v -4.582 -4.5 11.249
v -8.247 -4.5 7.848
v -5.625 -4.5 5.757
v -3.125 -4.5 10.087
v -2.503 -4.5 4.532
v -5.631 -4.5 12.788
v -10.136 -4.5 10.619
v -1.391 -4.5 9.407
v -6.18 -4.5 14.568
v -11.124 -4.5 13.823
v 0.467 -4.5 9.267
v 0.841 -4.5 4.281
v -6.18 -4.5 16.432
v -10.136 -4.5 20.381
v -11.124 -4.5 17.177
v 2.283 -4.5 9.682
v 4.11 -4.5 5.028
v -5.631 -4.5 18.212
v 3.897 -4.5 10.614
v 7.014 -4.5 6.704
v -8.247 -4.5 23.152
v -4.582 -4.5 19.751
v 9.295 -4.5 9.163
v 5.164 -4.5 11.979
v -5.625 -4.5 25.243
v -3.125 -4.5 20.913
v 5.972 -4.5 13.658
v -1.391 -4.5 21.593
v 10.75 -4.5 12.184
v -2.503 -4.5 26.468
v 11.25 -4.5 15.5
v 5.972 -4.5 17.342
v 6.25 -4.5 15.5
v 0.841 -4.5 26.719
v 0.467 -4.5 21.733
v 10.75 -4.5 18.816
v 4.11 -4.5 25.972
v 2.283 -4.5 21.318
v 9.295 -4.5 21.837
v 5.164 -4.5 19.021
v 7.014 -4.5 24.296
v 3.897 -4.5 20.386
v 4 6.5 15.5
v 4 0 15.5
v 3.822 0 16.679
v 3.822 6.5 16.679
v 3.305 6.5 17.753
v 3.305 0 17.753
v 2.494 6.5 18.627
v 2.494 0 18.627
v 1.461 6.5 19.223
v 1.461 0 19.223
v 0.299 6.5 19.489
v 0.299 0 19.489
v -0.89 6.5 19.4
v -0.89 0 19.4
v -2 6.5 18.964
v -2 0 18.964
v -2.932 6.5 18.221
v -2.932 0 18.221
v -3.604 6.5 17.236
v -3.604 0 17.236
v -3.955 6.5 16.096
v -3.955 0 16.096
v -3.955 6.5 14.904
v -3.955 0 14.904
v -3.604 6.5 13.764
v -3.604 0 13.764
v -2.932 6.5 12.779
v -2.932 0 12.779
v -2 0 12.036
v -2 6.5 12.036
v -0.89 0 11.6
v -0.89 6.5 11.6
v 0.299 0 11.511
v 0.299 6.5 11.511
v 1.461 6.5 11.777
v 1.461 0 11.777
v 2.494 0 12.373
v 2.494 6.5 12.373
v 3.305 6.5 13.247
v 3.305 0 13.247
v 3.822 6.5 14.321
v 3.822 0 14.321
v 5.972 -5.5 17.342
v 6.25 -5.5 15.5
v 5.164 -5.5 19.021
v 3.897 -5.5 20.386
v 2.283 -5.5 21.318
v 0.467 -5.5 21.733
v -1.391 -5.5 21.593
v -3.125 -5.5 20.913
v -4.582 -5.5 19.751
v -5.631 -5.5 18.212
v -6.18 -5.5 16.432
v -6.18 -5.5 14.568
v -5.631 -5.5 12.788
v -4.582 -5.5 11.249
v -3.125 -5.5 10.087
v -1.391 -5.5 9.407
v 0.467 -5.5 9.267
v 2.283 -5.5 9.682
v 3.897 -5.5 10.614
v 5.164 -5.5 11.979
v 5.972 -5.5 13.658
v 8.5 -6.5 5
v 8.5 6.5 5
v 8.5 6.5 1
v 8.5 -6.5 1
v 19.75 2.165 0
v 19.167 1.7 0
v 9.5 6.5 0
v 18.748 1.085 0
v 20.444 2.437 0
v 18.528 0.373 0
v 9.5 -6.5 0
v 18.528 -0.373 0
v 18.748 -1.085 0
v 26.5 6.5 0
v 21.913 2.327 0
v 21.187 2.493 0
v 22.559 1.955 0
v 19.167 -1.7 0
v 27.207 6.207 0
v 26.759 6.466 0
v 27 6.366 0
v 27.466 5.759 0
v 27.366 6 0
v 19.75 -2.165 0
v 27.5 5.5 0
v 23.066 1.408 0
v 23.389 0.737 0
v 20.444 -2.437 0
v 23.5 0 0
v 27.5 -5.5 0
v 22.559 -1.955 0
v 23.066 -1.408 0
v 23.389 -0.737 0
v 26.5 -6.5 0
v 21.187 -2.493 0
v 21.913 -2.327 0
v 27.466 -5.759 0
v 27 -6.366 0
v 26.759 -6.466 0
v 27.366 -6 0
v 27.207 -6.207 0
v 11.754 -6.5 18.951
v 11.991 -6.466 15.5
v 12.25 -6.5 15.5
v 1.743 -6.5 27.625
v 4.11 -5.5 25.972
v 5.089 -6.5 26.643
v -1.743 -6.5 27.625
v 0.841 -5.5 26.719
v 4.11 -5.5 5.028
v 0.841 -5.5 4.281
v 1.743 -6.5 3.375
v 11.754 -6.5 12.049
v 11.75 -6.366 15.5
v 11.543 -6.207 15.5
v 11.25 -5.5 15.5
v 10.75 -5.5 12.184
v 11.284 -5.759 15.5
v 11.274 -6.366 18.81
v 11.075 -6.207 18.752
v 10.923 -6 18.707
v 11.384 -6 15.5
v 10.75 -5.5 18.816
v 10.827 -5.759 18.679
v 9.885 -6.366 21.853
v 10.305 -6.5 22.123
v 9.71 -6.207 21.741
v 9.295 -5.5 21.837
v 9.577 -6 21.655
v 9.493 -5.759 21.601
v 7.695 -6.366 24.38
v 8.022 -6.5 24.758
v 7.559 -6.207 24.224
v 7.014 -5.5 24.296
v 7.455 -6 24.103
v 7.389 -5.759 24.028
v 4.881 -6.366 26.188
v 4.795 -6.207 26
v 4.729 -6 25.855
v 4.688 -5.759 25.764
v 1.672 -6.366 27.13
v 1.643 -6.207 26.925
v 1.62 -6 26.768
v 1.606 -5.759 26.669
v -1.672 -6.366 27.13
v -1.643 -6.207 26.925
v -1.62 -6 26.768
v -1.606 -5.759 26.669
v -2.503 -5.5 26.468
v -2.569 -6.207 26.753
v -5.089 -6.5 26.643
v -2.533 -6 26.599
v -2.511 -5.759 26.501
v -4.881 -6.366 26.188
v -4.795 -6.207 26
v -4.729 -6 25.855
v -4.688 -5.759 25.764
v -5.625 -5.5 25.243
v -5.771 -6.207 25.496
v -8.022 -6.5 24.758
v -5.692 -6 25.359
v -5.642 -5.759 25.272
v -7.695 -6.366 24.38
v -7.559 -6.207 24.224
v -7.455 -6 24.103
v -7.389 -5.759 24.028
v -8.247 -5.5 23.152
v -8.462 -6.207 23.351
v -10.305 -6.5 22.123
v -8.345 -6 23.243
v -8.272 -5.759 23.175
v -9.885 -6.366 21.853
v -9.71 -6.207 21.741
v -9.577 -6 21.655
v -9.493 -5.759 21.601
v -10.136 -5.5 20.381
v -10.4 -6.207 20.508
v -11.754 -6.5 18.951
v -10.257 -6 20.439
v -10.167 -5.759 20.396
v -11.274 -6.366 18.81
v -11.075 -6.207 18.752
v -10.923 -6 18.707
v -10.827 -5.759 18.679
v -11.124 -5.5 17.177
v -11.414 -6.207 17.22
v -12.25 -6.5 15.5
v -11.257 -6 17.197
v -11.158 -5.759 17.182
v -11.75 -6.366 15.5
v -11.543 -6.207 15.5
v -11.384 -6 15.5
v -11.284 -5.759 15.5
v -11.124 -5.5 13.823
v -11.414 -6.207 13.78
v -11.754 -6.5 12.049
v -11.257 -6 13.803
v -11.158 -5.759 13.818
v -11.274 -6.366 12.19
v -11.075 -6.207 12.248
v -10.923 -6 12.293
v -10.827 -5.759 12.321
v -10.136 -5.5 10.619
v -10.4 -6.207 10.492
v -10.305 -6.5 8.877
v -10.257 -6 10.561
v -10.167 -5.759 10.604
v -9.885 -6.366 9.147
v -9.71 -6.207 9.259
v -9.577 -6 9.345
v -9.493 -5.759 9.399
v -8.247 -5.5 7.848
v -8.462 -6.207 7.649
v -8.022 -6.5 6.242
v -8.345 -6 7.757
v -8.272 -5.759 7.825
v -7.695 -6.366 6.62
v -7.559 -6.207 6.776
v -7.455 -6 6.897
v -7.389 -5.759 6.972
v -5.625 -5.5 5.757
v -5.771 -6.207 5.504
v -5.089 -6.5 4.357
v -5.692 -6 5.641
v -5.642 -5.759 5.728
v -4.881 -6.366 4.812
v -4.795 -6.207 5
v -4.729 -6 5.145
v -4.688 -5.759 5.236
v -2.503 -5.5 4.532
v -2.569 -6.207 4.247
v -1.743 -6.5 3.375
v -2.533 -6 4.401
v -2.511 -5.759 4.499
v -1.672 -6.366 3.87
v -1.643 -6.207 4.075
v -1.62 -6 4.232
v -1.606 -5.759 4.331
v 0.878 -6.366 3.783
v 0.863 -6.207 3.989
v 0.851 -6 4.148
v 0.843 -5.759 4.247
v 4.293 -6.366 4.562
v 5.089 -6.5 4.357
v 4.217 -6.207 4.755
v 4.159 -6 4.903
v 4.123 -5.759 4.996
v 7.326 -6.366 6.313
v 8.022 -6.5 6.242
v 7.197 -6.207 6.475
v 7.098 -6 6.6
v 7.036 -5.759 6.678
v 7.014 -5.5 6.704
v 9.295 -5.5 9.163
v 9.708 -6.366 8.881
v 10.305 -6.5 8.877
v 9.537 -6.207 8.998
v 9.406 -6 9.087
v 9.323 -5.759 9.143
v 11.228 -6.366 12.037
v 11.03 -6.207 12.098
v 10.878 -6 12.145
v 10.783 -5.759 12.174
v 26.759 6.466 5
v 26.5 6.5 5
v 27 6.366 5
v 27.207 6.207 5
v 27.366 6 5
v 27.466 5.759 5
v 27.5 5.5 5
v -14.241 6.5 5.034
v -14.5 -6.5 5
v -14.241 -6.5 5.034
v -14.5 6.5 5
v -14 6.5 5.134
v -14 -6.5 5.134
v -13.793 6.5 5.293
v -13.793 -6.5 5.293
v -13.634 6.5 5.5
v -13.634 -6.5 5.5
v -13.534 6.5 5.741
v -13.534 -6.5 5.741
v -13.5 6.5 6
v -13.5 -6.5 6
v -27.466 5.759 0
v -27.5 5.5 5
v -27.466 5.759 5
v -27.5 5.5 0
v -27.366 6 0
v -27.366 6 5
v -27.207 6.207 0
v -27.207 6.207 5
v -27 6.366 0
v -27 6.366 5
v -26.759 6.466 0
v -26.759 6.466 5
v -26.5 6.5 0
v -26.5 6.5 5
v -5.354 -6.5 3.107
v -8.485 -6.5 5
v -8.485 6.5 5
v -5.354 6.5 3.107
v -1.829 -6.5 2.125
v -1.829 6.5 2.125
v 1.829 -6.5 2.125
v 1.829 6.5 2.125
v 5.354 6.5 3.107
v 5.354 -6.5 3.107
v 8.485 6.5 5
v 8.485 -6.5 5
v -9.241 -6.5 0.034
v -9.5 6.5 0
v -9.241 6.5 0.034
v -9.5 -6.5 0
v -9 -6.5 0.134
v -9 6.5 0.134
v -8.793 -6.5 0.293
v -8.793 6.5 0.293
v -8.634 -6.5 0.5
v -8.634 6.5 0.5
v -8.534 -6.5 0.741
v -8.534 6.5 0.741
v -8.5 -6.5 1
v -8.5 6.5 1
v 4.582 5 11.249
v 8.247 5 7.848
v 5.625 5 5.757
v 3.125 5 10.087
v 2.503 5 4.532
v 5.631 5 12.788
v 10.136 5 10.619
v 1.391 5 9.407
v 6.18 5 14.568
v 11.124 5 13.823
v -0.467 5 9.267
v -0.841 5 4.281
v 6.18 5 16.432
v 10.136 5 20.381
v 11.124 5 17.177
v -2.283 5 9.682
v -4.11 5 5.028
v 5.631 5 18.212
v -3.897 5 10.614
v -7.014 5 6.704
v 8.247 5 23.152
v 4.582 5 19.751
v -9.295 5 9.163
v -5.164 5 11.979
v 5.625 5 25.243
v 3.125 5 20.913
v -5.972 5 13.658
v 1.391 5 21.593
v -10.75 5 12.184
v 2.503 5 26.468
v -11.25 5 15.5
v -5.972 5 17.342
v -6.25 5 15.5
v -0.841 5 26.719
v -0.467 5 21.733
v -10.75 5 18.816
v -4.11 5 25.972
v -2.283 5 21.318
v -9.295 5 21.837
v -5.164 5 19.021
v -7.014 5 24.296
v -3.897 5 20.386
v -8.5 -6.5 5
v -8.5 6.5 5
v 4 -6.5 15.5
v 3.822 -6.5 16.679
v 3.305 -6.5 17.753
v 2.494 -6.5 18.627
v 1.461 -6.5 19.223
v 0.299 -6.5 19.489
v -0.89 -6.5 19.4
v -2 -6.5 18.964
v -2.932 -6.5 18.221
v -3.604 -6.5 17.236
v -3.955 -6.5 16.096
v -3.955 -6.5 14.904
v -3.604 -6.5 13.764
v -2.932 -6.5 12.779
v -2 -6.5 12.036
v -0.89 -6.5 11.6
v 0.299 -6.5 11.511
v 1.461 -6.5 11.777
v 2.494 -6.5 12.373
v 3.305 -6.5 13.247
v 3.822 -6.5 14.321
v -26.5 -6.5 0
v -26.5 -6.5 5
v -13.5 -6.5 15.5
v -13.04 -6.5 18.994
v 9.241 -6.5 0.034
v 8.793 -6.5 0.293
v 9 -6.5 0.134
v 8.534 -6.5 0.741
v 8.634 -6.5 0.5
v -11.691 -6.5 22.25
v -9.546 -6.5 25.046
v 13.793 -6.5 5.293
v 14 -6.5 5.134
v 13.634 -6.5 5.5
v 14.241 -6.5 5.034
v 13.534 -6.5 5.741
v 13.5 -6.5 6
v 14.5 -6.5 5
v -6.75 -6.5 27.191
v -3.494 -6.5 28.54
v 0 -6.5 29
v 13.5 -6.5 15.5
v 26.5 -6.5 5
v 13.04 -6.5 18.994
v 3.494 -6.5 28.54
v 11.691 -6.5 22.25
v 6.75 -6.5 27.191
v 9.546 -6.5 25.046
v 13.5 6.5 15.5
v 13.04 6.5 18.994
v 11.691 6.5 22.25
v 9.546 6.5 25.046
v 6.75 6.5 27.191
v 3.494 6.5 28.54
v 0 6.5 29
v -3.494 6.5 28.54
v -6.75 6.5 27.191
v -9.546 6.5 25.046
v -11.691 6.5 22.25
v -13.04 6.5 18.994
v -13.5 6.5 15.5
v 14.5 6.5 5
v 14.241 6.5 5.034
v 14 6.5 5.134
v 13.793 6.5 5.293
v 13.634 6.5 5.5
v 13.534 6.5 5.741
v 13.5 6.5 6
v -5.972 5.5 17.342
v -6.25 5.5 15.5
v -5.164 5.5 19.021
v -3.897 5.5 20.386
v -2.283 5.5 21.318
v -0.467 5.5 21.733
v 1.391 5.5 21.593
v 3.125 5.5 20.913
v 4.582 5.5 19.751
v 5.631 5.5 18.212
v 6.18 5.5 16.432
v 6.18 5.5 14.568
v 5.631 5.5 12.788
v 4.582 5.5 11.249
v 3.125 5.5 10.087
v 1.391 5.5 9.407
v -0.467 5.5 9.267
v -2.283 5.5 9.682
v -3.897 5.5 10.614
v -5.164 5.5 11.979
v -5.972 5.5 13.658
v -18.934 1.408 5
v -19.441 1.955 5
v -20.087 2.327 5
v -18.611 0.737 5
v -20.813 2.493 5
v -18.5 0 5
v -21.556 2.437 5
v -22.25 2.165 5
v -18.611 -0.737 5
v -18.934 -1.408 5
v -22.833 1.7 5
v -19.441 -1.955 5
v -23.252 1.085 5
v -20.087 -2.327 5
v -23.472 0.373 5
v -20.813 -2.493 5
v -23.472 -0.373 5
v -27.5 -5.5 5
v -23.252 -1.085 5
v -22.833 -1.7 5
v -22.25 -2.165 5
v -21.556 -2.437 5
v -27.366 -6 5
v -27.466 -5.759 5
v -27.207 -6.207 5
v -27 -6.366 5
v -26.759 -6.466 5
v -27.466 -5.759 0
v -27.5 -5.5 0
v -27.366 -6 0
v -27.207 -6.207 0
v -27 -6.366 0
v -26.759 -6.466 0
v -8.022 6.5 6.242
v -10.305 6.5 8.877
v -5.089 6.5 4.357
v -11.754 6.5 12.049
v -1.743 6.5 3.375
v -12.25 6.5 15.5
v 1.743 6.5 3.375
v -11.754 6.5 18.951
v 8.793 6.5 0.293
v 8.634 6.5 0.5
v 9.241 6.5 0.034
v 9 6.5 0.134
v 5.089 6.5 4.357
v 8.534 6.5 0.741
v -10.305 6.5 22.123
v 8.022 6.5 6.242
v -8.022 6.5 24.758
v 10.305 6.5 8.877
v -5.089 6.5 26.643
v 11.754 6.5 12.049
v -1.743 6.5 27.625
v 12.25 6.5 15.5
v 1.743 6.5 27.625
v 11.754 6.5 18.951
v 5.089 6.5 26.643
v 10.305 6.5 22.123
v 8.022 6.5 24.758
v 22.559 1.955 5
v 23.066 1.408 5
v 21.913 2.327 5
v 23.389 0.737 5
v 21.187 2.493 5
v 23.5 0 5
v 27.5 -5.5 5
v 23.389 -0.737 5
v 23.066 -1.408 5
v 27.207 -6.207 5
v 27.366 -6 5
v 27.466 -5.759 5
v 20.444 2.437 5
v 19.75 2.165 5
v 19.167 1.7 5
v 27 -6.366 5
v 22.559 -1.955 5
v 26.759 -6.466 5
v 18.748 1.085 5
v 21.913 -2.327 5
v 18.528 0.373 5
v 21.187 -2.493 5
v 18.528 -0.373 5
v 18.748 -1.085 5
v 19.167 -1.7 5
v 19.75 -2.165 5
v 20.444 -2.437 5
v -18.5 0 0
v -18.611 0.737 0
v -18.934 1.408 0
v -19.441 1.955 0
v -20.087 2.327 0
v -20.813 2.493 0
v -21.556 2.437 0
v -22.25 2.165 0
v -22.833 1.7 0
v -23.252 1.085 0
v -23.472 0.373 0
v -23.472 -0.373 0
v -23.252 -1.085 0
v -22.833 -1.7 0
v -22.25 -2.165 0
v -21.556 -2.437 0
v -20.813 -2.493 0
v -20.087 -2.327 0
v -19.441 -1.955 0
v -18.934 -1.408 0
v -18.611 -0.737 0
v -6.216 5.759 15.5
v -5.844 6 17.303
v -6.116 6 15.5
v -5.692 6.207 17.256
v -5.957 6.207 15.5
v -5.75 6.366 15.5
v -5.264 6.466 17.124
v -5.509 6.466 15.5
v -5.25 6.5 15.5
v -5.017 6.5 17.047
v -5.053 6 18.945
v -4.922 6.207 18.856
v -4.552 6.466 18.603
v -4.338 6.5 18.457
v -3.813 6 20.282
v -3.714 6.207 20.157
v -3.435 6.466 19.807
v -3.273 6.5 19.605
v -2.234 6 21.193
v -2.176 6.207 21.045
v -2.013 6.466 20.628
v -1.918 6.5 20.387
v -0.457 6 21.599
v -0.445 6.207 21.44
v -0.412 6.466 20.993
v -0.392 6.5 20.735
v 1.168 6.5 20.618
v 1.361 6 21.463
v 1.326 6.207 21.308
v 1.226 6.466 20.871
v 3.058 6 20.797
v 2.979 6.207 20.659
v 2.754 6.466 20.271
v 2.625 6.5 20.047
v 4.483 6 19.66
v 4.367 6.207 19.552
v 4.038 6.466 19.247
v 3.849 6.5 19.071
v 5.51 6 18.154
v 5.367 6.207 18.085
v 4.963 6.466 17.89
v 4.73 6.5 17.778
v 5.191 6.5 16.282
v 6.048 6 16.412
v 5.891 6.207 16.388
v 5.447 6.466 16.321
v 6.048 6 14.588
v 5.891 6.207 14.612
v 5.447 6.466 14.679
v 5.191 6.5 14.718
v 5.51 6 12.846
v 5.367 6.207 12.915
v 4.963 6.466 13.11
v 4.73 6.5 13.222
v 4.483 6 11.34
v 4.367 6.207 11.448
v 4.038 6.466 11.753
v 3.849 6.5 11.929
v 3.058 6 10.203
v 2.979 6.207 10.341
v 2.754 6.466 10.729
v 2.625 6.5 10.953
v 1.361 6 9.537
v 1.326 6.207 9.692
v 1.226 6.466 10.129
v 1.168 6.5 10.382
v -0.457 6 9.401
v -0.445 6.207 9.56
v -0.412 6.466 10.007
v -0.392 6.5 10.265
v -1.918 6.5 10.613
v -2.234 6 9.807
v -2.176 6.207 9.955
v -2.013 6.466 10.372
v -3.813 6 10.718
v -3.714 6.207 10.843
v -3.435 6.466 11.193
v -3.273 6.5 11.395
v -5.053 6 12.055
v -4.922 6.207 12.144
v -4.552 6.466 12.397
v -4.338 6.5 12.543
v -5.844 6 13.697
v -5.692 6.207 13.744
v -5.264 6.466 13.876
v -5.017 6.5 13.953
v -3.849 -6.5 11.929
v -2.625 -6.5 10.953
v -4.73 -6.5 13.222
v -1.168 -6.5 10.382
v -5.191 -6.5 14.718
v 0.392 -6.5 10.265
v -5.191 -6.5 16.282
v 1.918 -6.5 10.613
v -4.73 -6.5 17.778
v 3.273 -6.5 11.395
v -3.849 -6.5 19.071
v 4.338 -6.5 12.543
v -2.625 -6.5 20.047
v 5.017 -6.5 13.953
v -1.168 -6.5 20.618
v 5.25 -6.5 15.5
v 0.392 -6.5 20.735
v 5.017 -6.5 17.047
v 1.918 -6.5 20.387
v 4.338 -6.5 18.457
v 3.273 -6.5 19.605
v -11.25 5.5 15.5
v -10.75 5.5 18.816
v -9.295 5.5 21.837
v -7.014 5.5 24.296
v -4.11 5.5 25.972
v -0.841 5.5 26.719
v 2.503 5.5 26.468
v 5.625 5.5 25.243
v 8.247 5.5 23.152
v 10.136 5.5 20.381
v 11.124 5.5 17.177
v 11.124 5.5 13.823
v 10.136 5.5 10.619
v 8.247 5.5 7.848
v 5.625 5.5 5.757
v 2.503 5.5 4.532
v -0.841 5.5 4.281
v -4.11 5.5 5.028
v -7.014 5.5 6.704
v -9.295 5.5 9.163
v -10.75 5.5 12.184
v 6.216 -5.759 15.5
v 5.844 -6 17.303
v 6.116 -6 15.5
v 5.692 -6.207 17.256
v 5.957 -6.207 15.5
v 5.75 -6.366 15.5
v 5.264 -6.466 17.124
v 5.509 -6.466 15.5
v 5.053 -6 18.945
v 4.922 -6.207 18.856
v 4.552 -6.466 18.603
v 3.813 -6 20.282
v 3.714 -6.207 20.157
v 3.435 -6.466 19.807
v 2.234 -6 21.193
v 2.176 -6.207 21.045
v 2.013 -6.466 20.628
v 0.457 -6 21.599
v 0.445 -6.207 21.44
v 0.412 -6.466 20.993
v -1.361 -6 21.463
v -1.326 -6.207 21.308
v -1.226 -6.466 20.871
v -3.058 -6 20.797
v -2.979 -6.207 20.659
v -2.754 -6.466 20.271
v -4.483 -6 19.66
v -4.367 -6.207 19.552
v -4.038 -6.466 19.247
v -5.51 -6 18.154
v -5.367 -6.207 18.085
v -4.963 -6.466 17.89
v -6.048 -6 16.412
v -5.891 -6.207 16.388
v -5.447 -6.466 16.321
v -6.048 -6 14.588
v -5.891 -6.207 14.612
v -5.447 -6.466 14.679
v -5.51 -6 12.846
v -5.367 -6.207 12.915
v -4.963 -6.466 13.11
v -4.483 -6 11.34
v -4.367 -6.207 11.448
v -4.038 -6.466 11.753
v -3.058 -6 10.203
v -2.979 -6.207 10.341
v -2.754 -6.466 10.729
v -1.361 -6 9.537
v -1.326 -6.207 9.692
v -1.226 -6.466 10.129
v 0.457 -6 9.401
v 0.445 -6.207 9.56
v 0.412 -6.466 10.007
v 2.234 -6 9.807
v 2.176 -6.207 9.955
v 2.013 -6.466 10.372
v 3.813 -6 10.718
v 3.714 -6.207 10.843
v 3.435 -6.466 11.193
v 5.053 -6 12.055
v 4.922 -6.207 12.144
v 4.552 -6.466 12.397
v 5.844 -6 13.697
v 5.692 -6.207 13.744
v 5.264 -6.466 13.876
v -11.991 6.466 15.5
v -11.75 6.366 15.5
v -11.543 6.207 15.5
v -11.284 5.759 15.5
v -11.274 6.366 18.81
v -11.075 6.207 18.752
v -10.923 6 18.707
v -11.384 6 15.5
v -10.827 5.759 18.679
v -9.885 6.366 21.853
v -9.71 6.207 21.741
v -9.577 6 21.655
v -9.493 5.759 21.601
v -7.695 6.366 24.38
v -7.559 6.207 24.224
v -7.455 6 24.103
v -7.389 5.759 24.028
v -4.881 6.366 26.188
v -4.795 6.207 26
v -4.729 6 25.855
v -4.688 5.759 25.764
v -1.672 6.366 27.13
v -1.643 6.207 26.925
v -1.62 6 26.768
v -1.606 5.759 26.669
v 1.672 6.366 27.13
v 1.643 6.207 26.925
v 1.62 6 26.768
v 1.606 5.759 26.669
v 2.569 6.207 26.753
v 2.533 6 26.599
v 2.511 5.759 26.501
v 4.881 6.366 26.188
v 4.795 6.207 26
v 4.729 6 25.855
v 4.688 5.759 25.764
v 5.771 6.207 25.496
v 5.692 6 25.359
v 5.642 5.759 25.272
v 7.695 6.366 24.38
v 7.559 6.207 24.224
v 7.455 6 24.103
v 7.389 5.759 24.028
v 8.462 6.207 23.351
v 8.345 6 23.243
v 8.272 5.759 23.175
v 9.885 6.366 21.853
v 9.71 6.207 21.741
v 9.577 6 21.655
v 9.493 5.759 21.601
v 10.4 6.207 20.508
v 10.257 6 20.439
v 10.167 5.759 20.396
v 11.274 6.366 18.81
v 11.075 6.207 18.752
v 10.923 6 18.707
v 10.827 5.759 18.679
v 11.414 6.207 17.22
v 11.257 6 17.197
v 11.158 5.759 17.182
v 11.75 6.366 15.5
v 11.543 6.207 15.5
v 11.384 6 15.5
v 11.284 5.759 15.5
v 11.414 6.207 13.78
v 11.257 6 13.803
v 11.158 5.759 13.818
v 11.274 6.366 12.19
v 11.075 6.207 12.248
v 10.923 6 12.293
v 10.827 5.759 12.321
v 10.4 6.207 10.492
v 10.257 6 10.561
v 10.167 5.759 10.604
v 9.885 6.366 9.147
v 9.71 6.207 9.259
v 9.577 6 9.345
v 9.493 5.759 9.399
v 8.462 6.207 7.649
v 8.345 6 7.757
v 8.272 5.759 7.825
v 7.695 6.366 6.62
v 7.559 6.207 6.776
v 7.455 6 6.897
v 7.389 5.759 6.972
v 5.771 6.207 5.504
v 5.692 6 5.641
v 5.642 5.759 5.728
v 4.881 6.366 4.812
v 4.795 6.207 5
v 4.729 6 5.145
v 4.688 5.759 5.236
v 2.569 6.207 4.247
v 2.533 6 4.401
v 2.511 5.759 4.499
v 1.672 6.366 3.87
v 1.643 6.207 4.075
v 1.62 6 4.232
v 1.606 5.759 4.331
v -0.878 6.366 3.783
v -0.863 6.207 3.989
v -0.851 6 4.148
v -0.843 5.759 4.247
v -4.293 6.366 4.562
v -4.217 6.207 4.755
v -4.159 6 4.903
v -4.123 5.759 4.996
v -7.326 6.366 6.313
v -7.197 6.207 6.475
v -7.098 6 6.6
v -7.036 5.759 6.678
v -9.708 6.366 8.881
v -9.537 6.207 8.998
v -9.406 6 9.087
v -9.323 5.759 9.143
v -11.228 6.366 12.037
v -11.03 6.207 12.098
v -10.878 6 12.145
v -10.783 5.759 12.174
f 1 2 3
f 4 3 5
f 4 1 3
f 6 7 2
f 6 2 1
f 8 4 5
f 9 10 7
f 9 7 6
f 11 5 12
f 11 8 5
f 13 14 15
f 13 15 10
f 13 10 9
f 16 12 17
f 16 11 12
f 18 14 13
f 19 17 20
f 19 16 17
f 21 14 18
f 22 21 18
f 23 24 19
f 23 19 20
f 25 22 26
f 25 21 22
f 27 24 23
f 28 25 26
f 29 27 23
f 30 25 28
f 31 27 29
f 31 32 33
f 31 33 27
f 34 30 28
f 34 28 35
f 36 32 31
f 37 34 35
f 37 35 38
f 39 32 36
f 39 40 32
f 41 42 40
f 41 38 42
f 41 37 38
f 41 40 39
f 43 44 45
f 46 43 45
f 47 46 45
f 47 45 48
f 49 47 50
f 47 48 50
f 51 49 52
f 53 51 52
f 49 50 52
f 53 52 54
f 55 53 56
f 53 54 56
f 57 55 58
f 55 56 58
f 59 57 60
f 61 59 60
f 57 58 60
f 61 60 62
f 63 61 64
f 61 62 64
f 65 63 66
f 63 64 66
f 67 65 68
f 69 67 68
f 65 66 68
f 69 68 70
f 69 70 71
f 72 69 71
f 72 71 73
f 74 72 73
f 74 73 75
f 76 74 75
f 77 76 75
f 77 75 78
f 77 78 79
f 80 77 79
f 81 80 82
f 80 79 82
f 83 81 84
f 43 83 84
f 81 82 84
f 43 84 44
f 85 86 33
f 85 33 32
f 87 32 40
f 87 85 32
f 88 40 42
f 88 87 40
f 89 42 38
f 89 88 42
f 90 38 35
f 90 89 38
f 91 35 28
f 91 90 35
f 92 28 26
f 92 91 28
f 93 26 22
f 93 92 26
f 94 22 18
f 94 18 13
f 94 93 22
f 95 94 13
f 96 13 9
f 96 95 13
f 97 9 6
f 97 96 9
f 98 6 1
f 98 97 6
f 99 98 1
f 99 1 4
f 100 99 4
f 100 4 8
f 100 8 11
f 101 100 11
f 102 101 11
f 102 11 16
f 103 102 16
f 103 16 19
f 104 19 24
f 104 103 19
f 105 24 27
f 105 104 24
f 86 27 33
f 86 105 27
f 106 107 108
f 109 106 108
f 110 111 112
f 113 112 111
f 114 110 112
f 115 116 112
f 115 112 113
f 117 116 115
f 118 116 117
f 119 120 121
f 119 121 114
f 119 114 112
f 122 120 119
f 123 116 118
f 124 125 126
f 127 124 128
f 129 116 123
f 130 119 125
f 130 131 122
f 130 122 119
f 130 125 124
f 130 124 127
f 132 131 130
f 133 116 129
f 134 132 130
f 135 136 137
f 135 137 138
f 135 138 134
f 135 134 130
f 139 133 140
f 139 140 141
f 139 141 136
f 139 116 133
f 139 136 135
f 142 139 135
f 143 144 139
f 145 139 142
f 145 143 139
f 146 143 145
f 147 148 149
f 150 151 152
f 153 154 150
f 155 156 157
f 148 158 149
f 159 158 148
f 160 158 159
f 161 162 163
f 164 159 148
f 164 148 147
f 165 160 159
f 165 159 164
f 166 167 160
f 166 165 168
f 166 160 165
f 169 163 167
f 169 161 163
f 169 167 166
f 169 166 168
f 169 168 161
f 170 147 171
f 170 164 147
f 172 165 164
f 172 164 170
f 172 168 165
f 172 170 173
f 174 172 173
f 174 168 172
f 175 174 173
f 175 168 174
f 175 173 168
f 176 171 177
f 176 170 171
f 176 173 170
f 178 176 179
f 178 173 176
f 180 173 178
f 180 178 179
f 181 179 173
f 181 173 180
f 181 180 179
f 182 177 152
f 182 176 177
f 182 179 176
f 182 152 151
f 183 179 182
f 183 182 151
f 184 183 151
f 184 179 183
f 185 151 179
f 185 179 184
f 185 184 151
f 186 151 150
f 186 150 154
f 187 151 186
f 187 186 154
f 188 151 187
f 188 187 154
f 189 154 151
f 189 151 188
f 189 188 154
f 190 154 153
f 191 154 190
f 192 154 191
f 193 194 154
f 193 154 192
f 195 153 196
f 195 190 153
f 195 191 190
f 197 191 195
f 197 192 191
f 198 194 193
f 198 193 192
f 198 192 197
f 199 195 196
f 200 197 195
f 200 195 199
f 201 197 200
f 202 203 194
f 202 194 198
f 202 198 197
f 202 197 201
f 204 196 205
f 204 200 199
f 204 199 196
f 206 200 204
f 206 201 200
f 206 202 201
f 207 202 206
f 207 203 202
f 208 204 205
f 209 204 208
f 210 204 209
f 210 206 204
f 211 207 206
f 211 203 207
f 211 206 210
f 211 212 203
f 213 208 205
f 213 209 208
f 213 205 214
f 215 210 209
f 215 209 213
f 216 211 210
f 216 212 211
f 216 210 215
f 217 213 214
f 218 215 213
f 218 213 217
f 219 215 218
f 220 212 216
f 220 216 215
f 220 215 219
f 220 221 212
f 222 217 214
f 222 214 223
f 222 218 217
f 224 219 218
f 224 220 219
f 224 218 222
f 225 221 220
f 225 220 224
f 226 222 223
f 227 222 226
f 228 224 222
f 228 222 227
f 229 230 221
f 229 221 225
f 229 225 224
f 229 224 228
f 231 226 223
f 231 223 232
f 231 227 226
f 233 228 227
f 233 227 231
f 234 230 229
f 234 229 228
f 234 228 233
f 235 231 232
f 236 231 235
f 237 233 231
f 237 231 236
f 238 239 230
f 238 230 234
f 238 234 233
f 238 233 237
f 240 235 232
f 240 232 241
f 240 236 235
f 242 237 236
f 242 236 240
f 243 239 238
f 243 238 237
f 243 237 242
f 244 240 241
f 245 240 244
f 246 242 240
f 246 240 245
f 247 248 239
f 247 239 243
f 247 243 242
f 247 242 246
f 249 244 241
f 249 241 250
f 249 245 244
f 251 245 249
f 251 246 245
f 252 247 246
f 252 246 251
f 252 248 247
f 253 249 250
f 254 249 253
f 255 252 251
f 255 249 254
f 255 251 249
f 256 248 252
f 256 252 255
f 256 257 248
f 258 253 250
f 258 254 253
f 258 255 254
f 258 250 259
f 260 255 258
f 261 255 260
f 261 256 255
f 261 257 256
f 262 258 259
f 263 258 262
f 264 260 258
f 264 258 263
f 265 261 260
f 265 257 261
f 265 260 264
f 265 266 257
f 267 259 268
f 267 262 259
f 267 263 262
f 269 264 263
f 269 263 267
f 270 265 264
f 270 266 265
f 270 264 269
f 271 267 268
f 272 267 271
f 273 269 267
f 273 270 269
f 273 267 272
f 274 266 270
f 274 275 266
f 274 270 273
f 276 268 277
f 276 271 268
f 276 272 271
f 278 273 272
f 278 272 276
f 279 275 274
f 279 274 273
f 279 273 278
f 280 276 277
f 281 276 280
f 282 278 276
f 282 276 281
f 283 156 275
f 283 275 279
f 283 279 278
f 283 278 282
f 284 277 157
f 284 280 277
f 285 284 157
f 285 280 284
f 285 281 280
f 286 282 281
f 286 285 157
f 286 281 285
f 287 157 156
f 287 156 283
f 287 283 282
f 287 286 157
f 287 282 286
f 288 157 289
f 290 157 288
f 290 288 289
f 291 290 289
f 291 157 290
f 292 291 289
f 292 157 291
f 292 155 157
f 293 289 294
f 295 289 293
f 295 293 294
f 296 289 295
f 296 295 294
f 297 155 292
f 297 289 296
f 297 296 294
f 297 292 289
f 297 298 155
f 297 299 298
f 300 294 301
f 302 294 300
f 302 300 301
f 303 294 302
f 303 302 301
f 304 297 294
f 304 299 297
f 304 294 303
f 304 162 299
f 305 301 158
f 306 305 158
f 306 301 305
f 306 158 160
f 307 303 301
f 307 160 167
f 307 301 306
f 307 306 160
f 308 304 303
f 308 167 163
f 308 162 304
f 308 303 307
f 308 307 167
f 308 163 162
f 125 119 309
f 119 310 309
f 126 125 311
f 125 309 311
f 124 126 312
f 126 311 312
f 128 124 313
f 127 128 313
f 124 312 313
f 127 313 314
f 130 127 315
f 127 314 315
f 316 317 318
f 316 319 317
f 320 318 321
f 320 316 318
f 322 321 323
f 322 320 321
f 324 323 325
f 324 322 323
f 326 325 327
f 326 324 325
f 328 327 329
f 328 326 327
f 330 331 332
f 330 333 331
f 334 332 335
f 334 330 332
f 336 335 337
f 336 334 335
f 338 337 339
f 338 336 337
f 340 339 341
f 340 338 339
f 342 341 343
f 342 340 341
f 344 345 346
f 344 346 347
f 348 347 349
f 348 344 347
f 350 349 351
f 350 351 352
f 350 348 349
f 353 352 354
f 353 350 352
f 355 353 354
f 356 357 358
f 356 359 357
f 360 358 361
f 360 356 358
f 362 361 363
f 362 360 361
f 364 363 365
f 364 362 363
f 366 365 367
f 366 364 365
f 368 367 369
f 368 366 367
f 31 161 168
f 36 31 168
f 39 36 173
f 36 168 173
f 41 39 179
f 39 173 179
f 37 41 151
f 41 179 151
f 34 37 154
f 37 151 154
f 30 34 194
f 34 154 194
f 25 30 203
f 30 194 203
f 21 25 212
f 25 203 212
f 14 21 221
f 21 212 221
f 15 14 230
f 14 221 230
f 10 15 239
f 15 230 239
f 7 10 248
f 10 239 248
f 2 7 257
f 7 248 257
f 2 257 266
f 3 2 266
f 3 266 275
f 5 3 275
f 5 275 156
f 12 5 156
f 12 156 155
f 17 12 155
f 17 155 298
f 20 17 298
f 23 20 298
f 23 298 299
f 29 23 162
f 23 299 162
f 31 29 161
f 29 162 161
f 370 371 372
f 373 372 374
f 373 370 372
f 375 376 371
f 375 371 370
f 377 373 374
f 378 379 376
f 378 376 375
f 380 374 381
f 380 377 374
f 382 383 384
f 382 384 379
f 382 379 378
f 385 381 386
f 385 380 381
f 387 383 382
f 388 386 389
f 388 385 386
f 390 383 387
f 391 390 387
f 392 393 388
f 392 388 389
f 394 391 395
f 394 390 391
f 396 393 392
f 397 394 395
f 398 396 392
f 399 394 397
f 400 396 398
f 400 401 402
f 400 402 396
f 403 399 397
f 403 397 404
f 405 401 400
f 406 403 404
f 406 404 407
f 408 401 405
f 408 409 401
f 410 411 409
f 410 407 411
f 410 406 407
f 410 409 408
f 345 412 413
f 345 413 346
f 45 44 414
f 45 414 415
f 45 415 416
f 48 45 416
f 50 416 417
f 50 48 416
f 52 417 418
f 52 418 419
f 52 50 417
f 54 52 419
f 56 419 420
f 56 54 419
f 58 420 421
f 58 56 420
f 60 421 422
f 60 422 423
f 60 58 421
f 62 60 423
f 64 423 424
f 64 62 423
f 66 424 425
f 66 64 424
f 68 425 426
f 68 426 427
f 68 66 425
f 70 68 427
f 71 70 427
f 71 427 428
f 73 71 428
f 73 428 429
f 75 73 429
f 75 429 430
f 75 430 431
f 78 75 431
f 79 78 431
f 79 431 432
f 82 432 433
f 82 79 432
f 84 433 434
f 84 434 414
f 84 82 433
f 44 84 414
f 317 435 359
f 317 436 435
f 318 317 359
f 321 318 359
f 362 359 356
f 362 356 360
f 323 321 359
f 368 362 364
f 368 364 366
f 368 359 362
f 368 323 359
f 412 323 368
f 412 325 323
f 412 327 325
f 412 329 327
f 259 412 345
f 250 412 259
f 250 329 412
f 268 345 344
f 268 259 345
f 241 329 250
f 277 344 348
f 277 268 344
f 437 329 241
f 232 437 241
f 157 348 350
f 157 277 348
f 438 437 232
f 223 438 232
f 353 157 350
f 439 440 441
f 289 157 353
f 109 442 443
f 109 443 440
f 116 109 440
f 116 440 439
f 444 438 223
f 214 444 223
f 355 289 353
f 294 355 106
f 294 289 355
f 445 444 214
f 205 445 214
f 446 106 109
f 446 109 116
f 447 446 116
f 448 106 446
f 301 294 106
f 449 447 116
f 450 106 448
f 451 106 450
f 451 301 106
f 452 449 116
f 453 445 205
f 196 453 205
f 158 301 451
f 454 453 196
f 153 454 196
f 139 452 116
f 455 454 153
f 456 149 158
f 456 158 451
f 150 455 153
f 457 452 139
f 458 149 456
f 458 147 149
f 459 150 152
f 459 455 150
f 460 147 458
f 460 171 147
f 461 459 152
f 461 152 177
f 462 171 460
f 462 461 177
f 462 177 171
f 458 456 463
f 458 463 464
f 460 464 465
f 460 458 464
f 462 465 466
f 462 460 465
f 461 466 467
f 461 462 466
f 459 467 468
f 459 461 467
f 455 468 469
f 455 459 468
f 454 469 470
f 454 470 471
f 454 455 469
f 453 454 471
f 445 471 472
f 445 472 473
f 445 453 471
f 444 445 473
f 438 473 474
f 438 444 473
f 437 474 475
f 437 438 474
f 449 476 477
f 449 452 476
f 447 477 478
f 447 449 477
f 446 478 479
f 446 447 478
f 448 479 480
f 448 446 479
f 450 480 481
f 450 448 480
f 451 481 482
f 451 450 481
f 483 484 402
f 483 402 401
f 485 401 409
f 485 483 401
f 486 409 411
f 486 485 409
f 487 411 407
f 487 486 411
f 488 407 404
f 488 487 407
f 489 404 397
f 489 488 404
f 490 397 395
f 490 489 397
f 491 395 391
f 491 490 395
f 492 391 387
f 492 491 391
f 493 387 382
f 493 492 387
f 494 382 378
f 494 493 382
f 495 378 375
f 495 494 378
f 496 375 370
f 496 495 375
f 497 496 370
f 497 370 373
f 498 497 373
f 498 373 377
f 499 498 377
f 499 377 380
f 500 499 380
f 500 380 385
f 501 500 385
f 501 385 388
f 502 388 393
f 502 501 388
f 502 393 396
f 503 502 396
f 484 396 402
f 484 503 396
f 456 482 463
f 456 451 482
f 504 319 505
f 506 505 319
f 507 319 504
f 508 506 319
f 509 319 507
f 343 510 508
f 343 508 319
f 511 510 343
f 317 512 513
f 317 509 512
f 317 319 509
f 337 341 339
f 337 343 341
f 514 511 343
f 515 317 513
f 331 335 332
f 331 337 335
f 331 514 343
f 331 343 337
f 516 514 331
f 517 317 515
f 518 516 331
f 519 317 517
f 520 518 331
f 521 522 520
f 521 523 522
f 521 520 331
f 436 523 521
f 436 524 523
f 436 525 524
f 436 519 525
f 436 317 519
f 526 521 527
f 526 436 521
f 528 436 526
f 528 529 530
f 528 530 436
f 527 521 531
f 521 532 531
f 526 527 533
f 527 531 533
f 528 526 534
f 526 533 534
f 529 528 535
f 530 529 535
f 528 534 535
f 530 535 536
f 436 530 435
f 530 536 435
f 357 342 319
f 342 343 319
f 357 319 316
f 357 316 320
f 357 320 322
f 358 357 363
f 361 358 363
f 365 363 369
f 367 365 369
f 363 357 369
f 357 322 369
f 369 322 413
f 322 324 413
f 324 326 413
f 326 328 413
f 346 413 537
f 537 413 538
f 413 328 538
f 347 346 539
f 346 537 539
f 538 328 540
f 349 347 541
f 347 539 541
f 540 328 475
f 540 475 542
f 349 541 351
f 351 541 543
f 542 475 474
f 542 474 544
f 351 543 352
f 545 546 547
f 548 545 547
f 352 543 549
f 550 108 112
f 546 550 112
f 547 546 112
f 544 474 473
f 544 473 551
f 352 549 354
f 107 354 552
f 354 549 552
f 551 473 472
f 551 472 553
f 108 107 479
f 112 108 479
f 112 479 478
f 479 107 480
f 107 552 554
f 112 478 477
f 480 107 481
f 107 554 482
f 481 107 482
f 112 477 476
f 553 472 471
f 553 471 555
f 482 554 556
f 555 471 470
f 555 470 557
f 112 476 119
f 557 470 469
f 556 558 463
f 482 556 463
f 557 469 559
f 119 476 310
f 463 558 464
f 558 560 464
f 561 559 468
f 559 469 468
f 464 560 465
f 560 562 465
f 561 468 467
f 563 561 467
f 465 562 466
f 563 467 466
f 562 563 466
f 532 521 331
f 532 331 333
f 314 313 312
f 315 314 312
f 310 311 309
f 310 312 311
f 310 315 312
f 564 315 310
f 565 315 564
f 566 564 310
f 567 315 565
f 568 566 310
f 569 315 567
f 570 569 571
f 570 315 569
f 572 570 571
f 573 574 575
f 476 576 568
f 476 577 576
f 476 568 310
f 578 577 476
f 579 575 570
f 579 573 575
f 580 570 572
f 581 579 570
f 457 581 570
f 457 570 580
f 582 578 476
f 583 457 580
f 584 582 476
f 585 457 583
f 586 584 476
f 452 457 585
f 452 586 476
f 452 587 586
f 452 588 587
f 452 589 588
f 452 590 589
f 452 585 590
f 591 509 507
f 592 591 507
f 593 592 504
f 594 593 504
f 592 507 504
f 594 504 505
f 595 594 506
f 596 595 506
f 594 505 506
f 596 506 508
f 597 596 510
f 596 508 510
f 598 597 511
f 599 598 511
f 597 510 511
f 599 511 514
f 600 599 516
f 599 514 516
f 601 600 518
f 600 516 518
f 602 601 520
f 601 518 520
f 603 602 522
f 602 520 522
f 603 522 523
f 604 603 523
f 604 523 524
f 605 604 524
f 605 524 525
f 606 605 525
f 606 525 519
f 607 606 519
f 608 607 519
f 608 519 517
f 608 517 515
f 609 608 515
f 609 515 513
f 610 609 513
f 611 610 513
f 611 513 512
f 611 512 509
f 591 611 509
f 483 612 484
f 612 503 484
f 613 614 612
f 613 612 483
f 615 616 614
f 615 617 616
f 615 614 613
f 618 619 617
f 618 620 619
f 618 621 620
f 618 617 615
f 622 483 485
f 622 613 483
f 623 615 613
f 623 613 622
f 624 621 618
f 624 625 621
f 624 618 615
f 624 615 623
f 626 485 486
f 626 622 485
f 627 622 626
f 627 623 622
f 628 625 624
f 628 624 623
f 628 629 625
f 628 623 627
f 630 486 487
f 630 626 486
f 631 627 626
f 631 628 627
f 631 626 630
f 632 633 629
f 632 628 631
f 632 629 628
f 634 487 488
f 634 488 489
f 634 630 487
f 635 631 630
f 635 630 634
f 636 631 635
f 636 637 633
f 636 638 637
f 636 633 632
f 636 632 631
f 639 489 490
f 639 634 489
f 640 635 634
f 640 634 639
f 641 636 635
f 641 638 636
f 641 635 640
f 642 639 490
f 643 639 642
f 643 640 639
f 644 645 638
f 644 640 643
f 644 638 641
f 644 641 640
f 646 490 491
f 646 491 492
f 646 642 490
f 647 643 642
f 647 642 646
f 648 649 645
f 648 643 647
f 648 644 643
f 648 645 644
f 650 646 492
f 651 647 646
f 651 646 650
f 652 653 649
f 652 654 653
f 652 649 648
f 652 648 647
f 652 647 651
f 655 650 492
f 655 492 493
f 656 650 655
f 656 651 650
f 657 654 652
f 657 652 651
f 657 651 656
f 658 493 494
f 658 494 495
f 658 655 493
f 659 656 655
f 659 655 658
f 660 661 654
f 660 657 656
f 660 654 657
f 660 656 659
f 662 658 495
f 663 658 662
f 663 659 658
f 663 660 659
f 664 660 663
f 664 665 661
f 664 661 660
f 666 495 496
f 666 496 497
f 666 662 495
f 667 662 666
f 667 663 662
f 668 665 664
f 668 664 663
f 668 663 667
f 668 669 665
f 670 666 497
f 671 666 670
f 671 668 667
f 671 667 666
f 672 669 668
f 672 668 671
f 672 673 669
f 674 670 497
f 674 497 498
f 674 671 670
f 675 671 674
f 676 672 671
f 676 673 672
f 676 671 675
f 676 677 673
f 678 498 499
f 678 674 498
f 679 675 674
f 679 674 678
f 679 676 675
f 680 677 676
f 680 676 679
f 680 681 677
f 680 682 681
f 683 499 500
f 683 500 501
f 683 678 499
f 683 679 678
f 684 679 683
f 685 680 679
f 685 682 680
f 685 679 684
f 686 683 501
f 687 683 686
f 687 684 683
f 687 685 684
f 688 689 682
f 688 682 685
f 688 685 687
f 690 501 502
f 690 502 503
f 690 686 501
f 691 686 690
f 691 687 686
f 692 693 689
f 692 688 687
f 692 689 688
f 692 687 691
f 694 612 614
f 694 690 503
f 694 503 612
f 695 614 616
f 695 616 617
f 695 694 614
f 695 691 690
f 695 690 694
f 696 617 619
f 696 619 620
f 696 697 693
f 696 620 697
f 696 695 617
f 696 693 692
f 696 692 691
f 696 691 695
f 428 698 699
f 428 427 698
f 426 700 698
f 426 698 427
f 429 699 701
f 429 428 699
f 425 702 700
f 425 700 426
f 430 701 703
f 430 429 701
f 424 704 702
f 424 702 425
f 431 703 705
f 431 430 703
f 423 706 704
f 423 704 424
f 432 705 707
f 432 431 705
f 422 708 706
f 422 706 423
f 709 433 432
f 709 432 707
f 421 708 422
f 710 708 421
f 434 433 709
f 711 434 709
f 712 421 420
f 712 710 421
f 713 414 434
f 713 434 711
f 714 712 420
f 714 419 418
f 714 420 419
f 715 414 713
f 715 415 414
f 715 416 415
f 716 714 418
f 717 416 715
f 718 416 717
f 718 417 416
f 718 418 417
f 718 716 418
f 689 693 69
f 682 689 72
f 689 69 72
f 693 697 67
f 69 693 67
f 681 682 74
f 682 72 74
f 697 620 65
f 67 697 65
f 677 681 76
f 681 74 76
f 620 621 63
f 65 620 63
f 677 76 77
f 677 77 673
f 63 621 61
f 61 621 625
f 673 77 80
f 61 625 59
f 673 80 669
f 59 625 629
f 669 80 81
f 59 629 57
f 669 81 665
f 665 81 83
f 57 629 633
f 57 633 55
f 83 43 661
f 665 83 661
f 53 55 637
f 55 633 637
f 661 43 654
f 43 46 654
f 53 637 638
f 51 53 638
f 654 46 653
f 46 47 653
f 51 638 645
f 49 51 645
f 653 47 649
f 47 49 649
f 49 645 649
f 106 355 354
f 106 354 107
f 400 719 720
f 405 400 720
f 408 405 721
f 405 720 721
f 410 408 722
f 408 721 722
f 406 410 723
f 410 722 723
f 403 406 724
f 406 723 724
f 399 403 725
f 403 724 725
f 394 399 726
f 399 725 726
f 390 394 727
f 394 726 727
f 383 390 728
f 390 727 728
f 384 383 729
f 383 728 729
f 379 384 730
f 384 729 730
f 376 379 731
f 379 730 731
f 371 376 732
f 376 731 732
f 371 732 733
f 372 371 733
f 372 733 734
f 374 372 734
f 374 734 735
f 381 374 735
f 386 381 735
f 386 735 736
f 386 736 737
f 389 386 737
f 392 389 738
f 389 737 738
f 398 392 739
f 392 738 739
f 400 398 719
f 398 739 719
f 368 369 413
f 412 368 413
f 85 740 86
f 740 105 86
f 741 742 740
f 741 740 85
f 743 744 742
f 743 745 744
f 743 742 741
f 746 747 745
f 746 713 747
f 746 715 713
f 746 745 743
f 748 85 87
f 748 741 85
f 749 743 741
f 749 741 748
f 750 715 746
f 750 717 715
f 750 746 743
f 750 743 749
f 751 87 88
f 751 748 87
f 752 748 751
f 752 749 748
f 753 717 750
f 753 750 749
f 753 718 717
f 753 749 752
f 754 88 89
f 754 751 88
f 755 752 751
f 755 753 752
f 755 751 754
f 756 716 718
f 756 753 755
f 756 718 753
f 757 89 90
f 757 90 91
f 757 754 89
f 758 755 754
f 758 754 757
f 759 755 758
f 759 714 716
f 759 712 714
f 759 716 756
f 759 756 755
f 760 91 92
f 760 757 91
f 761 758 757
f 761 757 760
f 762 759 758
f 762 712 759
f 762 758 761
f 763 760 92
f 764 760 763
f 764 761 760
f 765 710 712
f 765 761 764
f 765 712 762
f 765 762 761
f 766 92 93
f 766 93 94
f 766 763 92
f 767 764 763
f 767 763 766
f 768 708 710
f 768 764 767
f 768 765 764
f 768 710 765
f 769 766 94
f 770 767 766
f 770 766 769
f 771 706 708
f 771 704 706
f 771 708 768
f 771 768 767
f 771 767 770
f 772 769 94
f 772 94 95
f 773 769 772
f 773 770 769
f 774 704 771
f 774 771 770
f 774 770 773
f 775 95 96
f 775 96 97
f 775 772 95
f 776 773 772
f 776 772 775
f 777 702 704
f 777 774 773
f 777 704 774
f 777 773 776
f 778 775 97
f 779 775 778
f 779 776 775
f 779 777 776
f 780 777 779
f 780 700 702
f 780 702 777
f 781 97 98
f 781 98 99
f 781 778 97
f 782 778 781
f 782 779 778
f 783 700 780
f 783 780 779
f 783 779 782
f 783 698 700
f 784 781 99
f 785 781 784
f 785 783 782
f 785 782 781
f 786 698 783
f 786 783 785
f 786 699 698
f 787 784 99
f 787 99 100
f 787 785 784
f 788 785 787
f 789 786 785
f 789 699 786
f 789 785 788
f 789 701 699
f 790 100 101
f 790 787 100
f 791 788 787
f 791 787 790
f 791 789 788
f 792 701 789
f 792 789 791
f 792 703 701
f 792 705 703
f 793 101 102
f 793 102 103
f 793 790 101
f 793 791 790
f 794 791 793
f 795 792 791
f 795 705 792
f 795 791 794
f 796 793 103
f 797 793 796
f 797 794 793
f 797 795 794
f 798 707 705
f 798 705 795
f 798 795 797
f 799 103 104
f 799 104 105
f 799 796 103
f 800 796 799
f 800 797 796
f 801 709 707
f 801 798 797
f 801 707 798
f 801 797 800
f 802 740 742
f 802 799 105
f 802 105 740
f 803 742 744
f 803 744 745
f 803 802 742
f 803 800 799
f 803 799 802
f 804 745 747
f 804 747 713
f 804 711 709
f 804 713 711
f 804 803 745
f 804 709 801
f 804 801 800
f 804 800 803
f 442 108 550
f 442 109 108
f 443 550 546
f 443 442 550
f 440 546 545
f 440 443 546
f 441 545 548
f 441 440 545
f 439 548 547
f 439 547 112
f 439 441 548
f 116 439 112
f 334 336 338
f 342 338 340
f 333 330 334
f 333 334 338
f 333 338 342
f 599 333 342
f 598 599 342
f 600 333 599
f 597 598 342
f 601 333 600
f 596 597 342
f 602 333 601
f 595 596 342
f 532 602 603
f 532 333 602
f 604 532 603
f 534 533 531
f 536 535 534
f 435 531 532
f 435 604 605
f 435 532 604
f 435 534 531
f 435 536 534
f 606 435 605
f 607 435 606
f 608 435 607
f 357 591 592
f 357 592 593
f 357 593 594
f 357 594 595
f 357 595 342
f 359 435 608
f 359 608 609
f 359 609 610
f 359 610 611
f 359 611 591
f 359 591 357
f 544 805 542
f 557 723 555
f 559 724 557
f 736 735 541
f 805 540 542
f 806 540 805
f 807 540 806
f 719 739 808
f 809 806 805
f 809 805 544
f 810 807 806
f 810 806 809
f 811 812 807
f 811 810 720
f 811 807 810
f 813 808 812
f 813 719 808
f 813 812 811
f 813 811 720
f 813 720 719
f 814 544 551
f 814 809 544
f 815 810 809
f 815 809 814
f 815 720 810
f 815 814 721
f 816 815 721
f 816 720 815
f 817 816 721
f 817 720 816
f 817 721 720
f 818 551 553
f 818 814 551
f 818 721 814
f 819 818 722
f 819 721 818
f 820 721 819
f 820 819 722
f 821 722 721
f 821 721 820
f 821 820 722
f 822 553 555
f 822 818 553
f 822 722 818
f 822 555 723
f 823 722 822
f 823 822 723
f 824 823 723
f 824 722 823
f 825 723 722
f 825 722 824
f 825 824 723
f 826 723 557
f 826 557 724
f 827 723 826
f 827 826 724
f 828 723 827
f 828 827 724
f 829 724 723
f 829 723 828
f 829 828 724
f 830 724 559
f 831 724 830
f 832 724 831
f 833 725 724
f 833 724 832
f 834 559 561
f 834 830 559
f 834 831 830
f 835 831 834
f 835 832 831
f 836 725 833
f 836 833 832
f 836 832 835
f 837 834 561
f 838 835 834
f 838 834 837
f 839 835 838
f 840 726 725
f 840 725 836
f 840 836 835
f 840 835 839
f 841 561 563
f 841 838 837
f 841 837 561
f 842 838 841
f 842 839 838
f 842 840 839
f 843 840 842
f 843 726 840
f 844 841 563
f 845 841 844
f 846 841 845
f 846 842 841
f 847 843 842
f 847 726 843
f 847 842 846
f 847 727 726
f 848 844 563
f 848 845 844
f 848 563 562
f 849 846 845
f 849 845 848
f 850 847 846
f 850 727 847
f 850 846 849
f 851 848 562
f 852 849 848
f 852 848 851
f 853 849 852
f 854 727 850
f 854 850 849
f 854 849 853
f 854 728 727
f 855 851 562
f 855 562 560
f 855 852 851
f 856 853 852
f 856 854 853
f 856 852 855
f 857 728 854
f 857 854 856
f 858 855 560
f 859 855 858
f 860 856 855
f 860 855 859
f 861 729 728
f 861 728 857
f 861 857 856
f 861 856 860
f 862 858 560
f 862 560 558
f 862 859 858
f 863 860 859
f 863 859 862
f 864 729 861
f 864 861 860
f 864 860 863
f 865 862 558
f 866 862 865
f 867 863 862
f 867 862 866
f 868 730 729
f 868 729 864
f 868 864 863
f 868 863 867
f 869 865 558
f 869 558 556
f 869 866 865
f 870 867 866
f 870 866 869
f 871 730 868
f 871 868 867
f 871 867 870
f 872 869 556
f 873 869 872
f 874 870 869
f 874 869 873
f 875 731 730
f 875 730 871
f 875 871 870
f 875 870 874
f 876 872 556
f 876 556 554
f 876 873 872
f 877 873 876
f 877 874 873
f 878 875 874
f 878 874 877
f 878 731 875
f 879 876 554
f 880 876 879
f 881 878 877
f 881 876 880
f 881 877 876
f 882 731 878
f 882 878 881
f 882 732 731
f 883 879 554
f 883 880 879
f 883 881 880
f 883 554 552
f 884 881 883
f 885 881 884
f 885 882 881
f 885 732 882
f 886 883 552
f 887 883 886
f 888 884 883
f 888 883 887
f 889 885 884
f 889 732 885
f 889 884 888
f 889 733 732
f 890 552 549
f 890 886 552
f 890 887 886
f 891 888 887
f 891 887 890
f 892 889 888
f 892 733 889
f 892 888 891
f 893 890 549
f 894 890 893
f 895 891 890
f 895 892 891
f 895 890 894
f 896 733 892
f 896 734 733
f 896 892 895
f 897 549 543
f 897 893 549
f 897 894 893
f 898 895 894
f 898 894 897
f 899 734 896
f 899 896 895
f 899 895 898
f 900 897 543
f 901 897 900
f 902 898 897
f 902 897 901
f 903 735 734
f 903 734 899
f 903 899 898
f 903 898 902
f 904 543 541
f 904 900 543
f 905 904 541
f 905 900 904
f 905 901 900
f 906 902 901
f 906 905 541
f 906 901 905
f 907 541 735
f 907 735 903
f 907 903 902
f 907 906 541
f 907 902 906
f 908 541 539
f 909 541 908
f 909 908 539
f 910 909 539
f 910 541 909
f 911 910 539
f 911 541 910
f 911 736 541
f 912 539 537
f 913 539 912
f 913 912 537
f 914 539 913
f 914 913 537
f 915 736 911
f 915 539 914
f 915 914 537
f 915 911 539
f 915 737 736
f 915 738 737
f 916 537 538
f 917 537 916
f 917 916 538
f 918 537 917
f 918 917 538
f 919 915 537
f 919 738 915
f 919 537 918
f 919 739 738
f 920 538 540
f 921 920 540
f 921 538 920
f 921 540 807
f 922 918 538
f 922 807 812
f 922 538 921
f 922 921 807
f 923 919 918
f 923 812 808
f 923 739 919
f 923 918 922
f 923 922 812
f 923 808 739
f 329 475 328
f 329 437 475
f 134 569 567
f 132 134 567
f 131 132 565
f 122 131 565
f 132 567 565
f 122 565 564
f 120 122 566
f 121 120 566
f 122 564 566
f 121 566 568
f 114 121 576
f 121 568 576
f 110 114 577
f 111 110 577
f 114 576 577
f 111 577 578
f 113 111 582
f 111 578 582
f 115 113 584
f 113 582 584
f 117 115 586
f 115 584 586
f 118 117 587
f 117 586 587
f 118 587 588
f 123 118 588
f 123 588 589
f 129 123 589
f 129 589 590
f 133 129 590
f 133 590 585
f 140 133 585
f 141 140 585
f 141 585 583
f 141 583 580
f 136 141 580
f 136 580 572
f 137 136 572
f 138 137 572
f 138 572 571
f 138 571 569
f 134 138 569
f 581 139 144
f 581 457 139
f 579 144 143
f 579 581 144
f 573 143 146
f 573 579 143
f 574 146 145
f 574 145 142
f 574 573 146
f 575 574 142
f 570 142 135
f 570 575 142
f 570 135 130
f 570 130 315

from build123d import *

# Parameters (mm, degrees)
F0_R          = 4
F1_DEPTH      = 6.5
F1_DEPTH_BACK = 6.5
F2_R          = 2.5
F3_DEPTH      = 25
F4_R          = 1
F5_R          = 11.25
F5_R_2        = 6.25
F6_DEPTH      = 2
F7_R          = 11.25
F7_R_2        = 6.25
F8_DEPTH      = 1.5
F9_R          = 1


with BuildPart() as f1:
    # F0 (on Front) → F1 (new body, two sides)
    with BuildSketch(Plane.XZ) as f1_sk:
        with BuildLine():
            Line((-27.5, 5), (-27.5, 0))
            Line((-27.5, 0), (-8.5, 0))
            Line((-8.5, 0), (-8.5, 5))
            Line((-8.5, 5), (-8.5, 5.011912))
            ThreePointArc((-8.5, 5.011912), (-8.492643, 5.005953), (-8.485281, 5))
            ThreePointArc((-8.485281, 5), (0, 2), (8.485281, 5))
            ThreePointArc((8.485281, 5), (8.492643, 5.005953), (8.5, 5.011912))
            Line((8.5, 5.011912), (8.5, 5))
            Line((8.5, 5), (8.5, 0))
            Line((8.5, 0), (27.5, 0))
            Line((27.5, 0), (27.5, 5))
            Line((27.5, 5), (13.5, 5))
            Line((13.5, 5), (13.5, 15.5))
            ThreePointArc((13.5, 15.5), (0, 29), (-13.5, 15.5))
            Line((-13.5, 15.5), (-13.5, 5))
            Line((-13.5, 5), (-27.5, 5))
        make_face()
        with Locations((0, 15.5)):
            Circle(F0_R, mode=Mode.SUBTRACT)
        with BuildLine():
            Line((-8.5, 5.011912), (-8.5, 5))
            Line((-8.5, 5), (-8.485281, 5))
            ThreePointArc((-8.485281, 5), (-8.492643, 5.005953), (-8.5, 5.011912))
        make_face()
        with BuildLine():
            ThreePointArc((8.5, 5.011912), (8.492643, 5.005953), (8.485281, 5))
            Line((8.485281, 5), (8.5, 5))
            Line((8.5, 5), (8.5, 5.011912))
        make_face()
    extrude(amount=F1_DEPTH)
    extrude(f1_sk.sketch, amount=-F1_DEPTH_BACK)

    # F2 (on face) → F3 (cut)
    with BuildSketch(Plane.XY.offset(5)):
        with Locations((-21, 0)):
            Circle(F2_R)
        with Locations((21, 0)):
            Circle(F2_R)
    extrude(amount=-F3_DEPTH, mode=Mode.SUBTRACT)

    # F4
    f4_edges = [f1.edges().sort_by_distance(p)[0] for p in [
        (-27.5, -6.5, 2.5),
        (-27.5, 6.5, 2.5),
        (27.5, -6.5, 2.5),
        (27.5, 6.5, 2.5),
        (13.5, 0, 5),
        (8.5, 0, 0),
        (-8.5, 0, 0),
        (-13.5, 0, 5),
    ]]
    fillet(f4_edges, radius=F4_R)

    # F5 (on face) → F6 (cut)
    with BuildSketch(Plane.XZ.offset(6.5)):
        with Locations((0, 15.5)):
            Circle(F5_R)
        with Locations((0, 15.5)):
            Circle(F5_R_2, mode=Mode.SUBTRACT)
    extrude(amount=-F6_DEPTH, mode=Mode.SUBTRACT)

    # F7 (on face) → F8 (cut)
    with BuildSketch(Plane(origin=(0, 6.5, 0), x_dir=(-1, 0, 0), z_dir=(0, 1, 0))):
        with Locations((0, 15.5)):
            Circle(F7_R)
        with Locations((0, 15.5)):
            Circle(F7_R_2, mode=Mode.SUBTRACT)
    extrude(amount=-F8_DEPTH, mode=Mode.SUBTRACT)

    # F9
    f9_edges = [f1.edges().sort_by_distance(p)[0] for p in [
        (11.25, 6.5, 15.5),
        (6.25, 6.5, 15.5),
        (-11.25, -6.5, 15.5),
        (-6.25, -6.5, 15.5),
    ]]
    fillet(f9_edges, radius=F9_R)


solid = f1.part
